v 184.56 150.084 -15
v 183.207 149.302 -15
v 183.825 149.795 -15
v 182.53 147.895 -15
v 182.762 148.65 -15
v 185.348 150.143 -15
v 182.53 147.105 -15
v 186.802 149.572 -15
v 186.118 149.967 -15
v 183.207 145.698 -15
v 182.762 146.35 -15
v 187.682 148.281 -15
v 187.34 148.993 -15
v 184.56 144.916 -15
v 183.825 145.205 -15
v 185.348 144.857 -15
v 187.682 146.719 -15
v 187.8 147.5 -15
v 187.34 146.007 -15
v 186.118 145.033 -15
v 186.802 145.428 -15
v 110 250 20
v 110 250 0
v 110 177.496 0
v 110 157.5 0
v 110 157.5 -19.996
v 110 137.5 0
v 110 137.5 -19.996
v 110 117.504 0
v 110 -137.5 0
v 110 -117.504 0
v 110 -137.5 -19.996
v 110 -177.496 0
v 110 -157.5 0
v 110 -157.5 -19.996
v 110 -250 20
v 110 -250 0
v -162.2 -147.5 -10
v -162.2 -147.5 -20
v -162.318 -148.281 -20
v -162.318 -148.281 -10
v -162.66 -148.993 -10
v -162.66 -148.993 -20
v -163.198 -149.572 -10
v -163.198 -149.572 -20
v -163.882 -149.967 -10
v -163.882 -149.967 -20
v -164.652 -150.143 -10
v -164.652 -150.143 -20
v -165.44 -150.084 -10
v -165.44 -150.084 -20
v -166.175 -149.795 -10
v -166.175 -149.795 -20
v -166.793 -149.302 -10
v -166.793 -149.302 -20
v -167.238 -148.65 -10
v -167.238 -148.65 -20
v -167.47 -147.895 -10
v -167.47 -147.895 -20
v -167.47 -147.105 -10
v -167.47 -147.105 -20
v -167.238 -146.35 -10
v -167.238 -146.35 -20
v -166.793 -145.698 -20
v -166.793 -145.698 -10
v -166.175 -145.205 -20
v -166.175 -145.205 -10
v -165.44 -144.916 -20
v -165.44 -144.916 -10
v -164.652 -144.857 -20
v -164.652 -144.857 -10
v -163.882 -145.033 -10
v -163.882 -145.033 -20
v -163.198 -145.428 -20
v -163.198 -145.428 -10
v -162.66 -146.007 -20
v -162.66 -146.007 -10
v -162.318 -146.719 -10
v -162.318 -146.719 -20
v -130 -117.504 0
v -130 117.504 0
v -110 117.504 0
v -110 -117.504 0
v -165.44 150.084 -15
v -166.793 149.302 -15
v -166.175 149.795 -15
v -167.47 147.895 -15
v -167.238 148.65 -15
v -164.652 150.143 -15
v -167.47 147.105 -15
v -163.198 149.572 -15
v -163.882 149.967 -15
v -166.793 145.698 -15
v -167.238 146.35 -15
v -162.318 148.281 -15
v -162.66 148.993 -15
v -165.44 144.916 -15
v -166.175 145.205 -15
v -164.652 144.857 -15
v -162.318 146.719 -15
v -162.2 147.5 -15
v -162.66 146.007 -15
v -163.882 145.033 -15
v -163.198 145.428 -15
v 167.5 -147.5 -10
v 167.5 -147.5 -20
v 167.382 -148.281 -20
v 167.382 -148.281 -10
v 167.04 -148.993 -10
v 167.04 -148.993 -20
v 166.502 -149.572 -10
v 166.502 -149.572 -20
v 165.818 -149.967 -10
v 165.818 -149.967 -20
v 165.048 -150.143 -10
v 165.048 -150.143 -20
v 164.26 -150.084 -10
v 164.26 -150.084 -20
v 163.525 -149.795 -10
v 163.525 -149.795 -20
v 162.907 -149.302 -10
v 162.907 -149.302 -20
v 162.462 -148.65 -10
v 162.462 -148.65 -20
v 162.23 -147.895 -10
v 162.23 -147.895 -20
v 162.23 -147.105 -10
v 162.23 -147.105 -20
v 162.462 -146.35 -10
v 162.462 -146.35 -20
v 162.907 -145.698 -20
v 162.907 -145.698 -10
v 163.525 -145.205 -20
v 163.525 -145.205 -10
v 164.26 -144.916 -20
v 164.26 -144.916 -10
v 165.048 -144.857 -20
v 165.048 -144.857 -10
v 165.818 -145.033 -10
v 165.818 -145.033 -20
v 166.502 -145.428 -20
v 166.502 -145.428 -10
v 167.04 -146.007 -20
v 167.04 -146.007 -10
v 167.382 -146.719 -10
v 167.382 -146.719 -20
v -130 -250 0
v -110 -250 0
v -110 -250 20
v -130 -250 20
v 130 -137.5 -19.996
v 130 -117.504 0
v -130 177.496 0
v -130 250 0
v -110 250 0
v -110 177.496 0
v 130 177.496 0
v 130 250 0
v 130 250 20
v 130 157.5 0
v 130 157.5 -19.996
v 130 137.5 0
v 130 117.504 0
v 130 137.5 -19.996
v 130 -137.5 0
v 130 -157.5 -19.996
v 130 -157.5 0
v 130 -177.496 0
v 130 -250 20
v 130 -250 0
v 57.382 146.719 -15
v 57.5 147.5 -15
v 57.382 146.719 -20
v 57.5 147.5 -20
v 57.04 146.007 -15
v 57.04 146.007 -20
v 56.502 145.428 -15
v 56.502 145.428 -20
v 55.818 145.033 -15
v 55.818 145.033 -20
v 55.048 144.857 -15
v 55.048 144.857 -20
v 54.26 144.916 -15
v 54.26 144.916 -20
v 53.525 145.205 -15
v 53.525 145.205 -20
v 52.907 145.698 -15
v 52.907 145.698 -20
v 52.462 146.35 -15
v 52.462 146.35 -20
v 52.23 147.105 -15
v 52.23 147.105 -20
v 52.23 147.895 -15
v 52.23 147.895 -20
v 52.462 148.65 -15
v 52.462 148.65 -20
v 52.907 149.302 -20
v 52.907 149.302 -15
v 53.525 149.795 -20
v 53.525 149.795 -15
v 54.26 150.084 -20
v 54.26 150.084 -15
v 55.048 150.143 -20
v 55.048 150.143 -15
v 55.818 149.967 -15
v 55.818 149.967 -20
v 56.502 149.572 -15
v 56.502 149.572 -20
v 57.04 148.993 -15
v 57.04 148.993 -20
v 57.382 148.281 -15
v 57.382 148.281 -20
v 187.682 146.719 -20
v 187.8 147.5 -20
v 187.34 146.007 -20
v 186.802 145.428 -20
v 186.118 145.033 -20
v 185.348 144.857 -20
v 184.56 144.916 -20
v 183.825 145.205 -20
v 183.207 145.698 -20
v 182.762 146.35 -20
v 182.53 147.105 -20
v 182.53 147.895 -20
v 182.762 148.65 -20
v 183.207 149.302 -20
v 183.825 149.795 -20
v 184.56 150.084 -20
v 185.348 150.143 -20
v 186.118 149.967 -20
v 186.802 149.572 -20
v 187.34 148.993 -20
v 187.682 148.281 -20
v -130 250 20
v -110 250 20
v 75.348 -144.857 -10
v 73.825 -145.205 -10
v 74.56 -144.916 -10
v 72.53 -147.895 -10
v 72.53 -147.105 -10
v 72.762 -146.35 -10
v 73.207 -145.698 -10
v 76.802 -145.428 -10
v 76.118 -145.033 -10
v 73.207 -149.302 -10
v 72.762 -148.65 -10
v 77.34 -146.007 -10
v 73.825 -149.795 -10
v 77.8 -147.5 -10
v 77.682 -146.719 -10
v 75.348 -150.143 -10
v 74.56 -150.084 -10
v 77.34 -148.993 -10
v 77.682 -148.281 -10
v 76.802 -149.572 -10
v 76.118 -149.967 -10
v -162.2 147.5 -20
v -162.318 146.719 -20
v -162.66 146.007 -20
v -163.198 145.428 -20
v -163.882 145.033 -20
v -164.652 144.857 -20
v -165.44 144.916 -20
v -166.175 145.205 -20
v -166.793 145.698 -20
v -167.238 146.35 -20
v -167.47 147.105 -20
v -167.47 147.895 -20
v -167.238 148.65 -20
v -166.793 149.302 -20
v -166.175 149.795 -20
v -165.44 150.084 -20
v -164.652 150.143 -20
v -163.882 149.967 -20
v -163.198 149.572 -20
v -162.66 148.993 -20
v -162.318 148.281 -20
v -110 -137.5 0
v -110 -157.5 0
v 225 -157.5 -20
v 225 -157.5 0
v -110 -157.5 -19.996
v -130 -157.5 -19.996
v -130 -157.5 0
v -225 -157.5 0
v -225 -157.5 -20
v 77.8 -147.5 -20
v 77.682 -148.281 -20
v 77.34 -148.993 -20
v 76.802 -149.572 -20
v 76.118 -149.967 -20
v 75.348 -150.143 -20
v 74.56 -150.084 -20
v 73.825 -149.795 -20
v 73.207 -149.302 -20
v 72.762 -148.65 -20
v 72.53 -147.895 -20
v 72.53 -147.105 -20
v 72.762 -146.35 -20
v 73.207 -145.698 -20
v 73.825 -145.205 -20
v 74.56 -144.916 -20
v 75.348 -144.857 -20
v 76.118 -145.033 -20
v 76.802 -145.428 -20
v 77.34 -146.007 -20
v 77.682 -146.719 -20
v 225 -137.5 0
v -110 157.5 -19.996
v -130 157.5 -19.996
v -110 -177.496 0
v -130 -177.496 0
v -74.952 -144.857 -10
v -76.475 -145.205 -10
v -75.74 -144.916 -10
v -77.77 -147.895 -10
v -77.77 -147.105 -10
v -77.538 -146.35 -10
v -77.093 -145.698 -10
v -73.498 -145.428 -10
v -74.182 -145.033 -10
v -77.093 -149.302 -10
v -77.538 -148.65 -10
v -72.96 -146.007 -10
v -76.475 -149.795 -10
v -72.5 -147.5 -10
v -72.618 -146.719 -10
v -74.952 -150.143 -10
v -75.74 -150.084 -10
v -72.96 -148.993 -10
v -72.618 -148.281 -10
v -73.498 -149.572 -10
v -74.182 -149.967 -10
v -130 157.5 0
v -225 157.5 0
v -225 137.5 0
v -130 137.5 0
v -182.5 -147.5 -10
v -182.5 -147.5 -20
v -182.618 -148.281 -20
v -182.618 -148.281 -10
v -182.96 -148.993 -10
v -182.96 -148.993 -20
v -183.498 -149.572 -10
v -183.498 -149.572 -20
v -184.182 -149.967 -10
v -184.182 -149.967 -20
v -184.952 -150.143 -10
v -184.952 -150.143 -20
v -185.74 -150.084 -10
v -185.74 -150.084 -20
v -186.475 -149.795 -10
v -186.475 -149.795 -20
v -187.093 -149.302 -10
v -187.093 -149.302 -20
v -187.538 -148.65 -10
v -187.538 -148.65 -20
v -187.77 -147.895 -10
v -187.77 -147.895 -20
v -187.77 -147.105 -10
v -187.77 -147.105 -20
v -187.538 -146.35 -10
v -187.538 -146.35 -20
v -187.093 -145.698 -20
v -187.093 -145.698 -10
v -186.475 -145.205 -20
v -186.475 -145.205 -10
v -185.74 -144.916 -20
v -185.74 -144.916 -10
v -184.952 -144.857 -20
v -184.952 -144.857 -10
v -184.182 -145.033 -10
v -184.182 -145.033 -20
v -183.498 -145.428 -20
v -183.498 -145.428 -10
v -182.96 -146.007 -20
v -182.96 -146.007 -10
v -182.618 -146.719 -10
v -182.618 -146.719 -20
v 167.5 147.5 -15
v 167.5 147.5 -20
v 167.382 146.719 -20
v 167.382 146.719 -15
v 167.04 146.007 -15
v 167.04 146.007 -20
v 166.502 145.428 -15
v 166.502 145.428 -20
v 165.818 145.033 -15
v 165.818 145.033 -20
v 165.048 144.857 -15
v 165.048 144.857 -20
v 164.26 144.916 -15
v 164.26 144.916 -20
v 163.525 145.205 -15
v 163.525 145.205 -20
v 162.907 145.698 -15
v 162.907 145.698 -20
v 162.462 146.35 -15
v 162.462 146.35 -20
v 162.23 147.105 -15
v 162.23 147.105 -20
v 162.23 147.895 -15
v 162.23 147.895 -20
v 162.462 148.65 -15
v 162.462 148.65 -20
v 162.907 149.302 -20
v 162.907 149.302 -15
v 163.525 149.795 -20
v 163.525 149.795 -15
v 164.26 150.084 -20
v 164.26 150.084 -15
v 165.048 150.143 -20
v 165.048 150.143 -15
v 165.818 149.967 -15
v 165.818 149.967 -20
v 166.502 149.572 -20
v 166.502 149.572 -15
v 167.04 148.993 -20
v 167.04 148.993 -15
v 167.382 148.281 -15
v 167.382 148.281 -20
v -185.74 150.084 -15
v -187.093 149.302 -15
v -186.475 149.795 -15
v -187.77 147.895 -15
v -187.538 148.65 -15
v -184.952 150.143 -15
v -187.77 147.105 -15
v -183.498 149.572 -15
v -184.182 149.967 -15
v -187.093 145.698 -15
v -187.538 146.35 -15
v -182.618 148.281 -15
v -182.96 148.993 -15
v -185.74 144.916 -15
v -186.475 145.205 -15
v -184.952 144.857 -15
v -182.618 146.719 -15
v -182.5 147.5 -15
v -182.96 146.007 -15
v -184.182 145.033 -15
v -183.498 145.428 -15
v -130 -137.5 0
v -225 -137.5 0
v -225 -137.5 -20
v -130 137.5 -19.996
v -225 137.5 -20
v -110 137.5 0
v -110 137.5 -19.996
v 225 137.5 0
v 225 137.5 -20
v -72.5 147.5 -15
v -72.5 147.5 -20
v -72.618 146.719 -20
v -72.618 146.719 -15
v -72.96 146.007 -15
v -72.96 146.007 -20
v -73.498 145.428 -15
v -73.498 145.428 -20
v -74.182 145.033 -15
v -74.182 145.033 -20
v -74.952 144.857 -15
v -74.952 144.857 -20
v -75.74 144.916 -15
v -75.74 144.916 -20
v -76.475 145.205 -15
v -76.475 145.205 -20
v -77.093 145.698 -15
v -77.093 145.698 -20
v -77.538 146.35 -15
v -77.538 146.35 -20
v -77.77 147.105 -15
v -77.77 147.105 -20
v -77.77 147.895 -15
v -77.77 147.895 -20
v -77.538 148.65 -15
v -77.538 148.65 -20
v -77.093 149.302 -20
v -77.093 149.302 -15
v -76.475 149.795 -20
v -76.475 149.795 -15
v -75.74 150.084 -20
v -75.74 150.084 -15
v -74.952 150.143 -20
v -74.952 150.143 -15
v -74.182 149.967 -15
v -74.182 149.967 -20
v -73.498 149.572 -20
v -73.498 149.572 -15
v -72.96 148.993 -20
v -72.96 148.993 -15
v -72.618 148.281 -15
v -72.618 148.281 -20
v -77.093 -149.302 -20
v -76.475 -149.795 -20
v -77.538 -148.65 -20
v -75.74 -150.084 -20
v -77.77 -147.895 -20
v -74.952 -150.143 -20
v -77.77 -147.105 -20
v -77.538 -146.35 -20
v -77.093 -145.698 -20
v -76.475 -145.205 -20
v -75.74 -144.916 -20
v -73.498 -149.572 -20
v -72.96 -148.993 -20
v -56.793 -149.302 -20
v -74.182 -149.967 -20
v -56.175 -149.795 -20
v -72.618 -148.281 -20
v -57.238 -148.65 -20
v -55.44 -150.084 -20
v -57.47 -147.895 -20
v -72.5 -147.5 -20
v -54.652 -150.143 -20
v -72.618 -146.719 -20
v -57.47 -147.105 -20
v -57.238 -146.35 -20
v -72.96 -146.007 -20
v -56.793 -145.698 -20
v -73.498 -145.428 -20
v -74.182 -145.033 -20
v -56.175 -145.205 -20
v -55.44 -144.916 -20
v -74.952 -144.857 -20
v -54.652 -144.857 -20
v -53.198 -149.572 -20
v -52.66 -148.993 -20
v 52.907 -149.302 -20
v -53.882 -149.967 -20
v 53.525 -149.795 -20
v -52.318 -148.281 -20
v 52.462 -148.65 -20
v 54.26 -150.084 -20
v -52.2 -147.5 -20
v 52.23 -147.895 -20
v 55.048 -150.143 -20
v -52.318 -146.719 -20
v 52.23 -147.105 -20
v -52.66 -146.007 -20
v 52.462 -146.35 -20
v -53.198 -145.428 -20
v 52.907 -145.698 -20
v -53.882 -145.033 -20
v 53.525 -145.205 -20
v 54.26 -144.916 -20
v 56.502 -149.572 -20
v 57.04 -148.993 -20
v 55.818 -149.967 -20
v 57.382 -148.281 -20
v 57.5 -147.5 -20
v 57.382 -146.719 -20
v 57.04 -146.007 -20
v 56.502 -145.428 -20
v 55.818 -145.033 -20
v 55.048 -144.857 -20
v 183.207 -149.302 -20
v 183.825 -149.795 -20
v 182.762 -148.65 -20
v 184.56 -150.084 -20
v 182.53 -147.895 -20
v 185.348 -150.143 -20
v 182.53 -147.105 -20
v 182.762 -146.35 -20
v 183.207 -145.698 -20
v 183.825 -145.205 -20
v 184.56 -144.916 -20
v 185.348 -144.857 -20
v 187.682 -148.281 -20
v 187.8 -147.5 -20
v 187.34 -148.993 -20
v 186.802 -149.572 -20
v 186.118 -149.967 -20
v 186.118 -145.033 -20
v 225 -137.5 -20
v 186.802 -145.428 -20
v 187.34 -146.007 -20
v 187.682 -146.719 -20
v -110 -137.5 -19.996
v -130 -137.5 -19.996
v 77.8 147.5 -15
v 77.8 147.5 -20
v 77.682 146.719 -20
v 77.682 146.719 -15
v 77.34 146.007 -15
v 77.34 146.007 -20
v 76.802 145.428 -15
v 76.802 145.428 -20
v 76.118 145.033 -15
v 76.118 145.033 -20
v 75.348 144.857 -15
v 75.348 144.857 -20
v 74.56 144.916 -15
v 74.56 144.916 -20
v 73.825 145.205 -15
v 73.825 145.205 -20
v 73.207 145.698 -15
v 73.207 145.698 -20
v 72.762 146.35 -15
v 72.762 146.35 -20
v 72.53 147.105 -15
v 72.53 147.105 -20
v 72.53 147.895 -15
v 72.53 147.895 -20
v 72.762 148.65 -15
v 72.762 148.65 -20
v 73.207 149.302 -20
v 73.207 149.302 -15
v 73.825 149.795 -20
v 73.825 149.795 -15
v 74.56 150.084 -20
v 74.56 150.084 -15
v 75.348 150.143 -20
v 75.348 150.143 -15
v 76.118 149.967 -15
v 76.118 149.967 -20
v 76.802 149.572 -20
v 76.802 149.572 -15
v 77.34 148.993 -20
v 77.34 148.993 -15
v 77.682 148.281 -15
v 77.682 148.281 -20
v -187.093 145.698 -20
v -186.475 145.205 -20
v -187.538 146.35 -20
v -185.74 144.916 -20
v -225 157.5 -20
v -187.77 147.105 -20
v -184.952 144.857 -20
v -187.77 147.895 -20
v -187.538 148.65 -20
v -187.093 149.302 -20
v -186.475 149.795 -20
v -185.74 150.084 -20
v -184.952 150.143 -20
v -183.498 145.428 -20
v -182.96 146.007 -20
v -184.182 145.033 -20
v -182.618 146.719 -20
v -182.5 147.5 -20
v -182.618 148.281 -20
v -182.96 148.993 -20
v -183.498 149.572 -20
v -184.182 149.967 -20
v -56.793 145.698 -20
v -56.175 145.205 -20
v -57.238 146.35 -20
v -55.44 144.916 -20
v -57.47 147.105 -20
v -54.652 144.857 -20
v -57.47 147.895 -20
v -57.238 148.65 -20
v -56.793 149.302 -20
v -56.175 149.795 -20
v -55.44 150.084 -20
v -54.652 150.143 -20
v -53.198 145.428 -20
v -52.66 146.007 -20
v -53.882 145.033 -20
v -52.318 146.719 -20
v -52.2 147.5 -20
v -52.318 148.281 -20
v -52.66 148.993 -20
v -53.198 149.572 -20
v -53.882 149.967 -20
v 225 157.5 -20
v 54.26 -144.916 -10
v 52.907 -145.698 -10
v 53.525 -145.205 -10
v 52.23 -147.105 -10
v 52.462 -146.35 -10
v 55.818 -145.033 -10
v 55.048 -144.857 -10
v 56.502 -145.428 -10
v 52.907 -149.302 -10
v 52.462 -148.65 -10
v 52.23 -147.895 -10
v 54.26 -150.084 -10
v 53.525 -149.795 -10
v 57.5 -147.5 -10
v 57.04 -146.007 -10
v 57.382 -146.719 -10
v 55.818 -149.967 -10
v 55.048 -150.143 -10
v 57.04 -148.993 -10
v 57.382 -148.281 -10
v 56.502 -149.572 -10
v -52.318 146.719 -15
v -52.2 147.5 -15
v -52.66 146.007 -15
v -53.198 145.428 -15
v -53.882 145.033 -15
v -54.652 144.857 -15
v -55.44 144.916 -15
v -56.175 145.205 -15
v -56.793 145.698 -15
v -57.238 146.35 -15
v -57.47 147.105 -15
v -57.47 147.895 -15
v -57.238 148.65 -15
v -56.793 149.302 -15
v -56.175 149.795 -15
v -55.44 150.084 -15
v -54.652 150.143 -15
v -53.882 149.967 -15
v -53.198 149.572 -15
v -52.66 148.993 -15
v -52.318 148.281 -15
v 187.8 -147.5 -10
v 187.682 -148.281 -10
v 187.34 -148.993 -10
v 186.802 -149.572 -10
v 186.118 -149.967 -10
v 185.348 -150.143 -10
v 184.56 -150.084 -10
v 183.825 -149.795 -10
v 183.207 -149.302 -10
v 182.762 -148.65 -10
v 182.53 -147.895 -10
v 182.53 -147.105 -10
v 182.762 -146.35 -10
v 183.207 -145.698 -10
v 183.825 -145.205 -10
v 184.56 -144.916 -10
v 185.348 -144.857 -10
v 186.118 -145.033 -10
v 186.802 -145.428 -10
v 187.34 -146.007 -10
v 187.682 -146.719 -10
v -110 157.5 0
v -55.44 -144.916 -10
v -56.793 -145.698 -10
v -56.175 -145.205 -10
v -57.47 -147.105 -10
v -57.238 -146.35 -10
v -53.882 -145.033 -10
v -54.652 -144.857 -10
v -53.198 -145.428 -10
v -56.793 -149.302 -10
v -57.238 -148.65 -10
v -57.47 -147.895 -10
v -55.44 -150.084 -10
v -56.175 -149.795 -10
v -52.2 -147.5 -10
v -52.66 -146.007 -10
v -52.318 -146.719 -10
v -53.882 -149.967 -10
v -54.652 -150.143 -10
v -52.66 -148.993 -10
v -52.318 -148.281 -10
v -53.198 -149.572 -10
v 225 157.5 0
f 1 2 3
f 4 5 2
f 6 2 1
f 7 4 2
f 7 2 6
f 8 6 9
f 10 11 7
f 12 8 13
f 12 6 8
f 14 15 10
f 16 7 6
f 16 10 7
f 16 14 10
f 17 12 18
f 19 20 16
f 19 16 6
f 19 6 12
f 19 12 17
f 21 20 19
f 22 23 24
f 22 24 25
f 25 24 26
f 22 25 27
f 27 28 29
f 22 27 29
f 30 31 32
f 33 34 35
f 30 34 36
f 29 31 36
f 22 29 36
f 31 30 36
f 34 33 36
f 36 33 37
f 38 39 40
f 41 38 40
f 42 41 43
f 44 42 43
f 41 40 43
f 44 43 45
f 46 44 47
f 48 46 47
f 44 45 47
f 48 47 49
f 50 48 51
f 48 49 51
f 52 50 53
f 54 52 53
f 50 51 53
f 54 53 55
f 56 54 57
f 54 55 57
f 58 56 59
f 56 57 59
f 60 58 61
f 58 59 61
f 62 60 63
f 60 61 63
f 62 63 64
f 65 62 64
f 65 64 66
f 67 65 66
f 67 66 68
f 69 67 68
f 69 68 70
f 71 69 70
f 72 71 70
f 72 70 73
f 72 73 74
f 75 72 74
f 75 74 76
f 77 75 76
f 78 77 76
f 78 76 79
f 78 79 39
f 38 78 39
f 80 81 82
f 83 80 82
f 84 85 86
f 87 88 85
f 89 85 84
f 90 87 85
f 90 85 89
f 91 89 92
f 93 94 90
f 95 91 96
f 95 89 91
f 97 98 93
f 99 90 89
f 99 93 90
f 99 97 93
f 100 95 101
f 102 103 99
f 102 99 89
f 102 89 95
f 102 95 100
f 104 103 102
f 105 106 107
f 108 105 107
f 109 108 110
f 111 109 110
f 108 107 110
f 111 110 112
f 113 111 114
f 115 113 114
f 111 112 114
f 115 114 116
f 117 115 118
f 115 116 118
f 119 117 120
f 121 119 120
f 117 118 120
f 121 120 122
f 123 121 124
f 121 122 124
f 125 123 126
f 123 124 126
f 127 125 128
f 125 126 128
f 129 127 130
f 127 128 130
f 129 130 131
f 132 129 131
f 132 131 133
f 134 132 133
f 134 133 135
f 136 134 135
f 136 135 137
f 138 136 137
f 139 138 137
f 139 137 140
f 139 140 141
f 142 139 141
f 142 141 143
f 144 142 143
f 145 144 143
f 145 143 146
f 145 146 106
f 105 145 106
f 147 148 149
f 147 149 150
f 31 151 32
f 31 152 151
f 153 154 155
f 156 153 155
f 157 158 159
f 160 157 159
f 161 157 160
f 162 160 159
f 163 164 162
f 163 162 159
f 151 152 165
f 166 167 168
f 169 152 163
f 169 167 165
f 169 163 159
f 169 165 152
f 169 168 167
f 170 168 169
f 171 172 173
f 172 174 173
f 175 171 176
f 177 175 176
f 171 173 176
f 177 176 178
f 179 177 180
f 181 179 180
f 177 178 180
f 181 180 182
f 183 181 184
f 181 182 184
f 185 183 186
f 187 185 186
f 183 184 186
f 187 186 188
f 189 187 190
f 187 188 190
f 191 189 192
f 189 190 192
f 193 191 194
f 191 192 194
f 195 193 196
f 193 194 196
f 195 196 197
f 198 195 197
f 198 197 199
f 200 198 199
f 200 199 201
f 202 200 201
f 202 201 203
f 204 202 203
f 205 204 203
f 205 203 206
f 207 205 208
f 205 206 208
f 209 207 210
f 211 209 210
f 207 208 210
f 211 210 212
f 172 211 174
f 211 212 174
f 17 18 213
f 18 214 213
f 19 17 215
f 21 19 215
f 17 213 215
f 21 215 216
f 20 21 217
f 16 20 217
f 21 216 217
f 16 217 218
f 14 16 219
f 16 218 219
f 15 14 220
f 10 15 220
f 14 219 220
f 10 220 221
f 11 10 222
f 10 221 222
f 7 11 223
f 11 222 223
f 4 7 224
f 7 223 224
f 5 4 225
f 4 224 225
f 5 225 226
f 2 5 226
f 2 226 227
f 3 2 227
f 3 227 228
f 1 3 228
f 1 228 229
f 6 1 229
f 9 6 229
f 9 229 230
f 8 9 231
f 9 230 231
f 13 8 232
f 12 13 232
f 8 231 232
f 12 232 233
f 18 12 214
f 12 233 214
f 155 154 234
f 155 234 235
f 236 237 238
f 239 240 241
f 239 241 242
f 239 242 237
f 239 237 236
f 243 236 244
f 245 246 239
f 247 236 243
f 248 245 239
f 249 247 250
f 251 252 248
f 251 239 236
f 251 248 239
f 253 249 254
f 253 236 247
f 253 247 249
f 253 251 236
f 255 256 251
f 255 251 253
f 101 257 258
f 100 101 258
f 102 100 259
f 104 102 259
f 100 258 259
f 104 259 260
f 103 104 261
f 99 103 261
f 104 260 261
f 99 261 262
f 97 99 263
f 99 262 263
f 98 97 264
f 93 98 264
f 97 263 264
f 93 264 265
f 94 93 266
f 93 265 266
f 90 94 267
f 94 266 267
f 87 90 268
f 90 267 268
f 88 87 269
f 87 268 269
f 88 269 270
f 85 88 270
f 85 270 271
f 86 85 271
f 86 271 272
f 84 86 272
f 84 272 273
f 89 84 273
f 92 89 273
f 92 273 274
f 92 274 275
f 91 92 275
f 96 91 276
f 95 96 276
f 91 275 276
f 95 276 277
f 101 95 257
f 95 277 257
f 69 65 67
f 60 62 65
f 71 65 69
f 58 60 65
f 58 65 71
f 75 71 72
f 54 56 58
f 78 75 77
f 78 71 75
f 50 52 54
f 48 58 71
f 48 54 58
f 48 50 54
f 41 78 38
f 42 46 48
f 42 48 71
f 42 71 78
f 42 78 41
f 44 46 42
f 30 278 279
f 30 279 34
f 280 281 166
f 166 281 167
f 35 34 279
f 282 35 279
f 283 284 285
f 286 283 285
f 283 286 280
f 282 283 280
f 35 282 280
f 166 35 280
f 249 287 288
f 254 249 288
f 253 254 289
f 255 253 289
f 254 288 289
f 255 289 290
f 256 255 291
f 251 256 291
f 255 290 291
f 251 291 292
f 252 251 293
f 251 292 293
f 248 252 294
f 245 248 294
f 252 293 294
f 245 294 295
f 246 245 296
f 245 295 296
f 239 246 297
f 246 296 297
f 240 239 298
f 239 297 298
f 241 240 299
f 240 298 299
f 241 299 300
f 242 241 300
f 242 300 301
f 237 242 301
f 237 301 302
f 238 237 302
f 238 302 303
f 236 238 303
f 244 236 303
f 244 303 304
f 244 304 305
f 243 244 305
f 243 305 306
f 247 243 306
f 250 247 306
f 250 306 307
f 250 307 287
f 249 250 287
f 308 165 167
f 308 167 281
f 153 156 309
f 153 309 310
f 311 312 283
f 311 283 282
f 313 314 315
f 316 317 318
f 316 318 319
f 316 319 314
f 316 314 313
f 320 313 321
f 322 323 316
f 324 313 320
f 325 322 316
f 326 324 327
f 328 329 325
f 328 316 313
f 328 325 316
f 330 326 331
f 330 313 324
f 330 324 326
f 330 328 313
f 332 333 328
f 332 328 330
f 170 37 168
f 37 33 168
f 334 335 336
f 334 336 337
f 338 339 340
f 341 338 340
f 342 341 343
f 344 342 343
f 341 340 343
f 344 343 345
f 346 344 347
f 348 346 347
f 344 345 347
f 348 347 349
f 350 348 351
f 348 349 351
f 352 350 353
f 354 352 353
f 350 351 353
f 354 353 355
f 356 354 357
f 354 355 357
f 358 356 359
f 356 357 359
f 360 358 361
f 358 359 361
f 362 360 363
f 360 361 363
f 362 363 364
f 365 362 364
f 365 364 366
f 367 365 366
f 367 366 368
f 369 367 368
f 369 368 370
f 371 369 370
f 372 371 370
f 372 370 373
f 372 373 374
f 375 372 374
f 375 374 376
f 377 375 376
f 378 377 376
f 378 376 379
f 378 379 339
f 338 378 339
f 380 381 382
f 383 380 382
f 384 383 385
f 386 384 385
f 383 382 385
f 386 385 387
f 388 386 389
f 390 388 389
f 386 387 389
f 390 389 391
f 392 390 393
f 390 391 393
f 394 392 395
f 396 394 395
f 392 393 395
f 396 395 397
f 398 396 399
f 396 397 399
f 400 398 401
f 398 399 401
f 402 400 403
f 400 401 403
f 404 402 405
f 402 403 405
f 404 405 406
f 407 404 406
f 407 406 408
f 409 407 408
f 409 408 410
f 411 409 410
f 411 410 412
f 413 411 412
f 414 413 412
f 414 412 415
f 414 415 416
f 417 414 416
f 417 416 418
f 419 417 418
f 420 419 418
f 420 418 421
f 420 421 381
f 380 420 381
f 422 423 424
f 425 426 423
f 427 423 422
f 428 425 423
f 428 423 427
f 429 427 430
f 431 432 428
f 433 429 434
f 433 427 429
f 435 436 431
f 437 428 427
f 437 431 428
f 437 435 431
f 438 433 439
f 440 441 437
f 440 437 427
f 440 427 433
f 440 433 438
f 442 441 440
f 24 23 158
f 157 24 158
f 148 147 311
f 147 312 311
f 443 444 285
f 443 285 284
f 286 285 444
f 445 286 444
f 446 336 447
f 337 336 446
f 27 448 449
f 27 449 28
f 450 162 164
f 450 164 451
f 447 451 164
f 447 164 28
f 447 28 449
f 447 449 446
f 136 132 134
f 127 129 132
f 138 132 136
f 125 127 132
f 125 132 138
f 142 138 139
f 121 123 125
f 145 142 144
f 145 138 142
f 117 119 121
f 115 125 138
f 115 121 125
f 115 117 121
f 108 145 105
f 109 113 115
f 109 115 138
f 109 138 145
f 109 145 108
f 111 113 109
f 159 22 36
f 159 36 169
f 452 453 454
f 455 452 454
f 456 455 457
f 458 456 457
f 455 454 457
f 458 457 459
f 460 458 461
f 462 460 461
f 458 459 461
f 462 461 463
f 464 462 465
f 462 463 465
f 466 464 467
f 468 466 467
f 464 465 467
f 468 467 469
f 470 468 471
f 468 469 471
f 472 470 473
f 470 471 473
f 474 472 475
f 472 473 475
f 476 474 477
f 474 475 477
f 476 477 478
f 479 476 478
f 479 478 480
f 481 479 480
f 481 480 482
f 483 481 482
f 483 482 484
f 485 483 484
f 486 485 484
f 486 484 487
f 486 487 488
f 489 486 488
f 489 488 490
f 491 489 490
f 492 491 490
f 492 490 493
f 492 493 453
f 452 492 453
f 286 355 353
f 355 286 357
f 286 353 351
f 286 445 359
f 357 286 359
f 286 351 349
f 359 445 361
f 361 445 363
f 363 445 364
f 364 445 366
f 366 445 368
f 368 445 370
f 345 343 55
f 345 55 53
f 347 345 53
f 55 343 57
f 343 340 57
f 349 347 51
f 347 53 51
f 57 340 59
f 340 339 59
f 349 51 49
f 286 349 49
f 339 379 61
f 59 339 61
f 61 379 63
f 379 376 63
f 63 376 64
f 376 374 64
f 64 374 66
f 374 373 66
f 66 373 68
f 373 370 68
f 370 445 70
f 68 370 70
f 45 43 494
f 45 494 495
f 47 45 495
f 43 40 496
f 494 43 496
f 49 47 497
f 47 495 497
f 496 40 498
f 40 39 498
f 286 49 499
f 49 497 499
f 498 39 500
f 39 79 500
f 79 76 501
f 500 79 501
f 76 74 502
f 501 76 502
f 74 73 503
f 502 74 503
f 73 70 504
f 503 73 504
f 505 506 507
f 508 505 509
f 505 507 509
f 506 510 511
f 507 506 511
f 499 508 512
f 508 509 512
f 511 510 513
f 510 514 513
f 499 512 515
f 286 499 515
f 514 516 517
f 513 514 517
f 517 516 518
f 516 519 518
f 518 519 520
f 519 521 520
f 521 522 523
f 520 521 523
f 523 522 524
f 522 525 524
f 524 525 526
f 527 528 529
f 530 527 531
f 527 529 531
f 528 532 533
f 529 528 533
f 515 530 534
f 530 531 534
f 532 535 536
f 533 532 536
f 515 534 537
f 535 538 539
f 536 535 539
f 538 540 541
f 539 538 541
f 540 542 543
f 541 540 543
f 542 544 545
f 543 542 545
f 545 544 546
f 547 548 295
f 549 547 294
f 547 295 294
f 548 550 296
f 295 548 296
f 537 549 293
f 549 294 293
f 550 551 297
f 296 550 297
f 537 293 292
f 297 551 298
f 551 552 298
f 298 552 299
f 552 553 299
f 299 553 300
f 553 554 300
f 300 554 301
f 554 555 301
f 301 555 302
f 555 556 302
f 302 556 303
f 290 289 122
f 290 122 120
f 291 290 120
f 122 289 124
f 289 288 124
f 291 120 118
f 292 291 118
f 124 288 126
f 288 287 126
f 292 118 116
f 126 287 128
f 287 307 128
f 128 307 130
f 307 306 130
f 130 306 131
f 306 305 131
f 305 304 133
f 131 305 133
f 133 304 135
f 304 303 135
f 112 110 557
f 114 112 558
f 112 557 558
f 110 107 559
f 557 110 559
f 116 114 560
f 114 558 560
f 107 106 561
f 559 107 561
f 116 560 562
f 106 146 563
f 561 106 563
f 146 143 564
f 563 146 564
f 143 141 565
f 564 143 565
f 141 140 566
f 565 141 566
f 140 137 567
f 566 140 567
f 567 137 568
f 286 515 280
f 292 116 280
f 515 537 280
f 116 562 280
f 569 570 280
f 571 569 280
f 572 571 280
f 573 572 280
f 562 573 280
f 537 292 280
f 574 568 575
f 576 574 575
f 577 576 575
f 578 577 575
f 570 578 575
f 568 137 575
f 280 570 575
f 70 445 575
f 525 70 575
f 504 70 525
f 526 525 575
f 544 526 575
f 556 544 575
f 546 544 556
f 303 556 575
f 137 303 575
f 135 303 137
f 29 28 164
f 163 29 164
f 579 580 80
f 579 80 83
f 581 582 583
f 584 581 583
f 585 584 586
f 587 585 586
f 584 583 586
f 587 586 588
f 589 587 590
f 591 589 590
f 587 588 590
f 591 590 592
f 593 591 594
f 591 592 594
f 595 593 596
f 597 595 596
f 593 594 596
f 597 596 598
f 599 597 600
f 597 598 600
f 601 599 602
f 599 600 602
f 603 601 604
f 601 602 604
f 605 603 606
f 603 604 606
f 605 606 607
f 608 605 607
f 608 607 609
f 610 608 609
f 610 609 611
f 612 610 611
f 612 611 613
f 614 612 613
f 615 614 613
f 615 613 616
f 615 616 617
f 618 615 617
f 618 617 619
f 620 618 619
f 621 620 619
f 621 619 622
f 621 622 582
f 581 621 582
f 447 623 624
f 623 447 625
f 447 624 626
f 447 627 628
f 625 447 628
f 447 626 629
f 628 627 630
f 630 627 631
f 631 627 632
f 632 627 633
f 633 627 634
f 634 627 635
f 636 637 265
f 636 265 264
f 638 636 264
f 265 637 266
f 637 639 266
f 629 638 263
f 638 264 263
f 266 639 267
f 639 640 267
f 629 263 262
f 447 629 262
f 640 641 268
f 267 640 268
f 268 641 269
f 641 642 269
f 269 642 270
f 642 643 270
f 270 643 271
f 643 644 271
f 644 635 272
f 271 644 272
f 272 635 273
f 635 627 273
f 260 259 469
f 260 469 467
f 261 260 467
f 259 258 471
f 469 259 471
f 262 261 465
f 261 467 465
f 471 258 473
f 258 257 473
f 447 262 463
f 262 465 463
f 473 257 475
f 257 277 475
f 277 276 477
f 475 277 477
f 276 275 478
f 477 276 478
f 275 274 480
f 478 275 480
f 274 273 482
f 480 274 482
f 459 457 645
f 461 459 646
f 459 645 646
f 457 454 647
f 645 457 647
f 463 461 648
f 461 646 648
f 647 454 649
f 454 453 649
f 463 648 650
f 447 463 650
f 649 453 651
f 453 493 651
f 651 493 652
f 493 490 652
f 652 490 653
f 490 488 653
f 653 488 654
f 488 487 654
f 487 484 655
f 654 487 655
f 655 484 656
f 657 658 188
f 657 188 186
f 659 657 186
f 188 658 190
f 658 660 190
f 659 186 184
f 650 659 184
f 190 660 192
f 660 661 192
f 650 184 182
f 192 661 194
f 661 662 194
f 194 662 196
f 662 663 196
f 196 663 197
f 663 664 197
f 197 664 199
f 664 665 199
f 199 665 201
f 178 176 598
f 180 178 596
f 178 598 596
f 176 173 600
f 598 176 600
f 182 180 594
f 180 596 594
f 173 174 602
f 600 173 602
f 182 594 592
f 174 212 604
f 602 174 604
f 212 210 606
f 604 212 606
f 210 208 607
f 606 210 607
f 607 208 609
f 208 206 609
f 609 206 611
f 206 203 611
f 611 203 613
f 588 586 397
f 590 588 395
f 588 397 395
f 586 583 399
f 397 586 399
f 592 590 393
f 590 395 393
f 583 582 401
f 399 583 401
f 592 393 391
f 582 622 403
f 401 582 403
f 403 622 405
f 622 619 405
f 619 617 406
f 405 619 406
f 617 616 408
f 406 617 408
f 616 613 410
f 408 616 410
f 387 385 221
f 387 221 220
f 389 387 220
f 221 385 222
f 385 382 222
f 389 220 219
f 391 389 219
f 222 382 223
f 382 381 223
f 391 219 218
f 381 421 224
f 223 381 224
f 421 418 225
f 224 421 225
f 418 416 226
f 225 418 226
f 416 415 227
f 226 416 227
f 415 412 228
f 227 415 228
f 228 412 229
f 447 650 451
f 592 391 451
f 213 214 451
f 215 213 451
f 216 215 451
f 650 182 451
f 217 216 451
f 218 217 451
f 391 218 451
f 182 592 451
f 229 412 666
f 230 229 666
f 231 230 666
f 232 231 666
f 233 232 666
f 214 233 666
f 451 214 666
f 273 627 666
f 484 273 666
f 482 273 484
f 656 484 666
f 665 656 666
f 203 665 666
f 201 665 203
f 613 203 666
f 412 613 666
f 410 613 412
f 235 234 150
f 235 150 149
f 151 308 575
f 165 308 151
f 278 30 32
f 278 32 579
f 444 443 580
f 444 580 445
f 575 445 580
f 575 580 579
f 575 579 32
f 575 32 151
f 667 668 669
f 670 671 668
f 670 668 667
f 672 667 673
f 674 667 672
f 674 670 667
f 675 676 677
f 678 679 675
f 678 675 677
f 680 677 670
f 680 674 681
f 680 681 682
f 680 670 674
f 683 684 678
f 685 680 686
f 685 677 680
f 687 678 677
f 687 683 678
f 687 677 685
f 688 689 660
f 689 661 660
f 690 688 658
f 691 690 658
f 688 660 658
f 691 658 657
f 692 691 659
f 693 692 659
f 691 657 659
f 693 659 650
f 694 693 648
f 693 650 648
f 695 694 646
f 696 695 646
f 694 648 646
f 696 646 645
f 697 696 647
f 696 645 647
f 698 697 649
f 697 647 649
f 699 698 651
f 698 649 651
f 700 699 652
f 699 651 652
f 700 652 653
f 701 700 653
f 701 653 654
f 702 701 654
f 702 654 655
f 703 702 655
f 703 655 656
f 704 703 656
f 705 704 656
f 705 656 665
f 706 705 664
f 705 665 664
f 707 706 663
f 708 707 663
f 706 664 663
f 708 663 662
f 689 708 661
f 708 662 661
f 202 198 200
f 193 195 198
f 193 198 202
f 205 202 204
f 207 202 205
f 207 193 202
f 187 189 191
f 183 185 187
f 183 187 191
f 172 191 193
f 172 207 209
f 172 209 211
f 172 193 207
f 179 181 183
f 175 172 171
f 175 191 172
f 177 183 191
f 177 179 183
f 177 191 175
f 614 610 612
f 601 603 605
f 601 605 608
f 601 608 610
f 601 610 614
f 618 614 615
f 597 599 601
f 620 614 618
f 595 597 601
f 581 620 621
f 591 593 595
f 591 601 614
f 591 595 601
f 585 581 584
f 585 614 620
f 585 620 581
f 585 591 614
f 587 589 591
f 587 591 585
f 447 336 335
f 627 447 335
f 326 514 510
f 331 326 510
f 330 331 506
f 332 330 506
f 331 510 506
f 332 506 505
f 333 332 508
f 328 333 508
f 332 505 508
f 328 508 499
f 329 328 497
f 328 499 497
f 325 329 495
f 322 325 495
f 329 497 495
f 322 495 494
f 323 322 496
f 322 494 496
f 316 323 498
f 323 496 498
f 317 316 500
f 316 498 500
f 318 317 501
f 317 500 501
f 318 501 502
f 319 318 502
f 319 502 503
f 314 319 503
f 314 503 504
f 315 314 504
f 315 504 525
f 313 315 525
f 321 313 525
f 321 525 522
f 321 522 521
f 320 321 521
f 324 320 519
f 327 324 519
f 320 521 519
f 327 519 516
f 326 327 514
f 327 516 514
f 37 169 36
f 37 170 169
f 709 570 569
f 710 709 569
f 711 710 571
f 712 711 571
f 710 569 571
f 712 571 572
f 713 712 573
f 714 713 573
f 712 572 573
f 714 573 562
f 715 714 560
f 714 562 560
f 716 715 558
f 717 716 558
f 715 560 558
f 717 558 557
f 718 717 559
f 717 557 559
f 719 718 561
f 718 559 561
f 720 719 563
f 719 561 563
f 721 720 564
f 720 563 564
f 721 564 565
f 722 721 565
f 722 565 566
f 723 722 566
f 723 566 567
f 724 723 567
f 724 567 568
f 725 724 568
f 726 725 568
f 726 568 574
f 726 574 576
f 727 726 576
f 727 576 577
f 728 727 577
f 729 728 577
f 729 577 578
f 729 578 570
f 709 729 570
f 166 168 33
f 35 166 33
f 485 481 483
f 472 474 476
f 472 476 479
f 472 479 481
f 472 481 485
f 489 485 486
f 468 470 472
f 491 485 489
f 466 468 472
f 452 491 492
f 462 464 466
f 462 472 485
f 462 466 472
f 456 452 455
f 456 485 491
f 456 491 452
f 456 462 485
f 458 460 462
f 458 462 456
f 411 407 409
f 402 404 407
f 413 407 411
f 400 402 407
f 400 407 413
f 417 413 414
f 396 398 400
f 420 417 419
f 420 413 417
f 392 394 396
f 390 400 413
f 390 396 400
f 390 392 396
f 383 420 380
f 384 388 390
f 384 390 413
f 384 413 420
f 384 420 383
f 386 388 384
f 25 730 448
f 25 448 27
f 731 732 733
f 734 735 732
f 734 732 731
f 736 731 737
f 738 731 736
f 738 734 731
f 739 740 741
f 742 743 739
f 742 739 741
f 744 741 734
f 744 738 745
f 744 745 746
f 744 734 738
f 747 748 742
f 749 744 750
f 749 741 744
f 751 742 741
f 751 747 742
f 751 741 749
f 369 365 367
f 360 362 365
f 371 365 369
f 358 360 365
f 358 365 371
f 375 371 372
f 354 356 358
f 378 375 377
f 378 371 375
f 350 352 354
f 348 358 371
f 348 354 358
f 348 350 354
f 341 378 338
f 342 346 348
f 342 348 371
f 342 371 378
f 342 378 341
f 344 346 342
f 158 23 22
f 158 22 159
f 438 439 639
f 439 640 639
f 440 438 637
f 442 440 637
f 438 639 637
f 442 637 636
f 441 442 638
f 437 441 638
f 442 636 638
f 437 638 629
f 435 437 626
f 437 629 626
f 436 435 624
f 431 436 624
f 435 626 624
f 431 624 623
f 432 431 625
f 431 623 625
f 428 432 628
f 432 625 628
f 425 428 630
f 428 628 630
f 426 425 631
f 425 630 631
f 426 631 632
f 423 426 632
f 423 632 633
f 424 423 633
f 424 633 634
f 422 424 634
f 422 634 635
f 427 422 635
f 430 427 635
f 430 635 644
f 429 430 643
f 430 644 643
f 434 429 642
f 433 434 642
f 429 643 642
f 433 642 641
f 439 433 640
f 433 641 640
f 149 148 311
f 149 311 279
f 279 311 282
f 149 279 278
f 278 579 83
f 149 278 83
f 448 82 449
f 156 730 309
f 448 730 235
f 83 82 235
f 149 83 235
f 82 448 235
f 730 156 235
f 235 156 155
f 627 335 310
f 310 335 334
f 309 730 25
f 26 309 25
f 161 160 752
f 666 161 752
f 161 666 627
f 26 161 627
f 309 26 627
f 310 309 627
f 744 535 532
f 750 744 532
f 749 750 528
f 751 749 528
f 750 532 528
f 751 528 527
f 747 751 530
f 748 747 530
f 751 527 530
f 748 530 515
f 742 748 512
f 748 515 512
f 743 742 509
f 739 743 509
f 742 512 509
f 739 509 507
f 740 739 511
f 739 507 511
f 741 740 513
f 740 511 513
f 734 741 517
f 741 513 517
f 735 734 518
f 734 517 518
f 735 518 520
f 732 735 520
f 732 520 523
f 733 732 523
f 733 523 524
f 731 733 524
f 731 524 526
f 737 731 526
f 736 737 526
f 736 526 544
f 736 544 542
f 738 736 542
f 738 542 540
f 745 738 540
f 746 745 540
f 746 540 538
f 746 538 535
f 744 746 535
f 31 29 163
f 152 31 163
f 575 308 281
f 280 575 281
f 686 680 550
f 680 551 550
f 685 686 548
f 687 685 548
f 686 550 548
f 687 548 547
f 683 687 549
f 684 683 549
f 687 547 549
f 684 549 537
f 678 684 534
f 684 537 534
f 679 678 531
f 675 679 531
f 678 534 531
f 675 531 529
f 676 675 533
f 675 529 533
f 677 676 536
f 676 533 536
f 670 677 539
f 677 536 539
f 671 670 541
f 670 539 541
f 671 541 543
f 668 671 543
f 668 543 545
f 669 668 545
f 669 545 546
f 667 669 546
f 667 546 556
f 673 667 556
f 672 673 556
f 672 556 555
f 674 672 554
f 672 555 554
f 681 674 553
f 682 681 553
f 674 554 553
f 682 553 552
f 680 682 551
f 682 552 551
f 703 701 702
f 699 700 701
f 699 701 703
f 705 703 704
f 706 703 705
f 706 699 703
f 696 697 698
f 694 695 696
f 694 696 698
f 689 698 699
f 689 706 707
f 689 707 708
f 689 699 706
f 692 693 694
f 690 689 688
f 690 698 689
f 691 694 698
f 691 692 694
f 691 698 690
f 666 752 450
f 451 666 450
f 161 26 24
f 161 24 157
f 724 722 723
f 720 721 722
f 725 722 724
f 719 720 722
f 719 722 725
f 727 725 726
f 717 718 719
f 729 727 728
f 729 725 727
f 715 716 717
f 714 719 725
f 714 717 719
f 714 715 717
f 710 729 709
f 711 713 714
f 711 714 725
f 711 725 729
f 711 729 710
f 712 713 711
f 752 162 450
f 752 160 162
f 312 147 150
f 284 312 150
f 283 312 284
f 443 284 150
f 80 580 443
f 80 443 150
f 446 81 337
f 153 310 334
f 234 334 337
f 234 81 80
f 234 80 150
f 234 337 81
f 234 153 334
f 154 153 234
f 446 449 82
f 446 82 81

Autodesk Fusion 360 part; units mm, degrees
sketch "草图1" plane through (0, 0, 0) normal (0, 0, 1) x (1, 0, 0)
  line L0 (110, -137.5) -> (-110, -137.5)
  line L1 (-110, -137.5) -> (-110, 137.5)
  line L2 (-110, 137.5) -> (110, 137.5)
  line L3 (110, 137.5) -> (110, -137.5)
  line L4 (110, -137.5) -> (-110, 137.5) construction
  line L5 (-110, -137.5) -> (110, 137.5) construction
  line L6 (130, -157.5) -> (-130, -157.5)
  line L7 (-130, -157.5) -> (-130, 157.5)
  line L8 (-130, 157.5) -> (130, 157.5)
  line L9 (130, 157.5) -> (130, -157.5)
  line L10 (130, -157.5) -> (-130, 157.5) construction
  line L11 (-130, -157.5) -> (130, 157.5) construction
  line L12 (110, 137.5) -> (225, 137.5)
  line L13 (225, 137.5) -> (-225, 137.5)
  line L14 (0, 0) -> (0, 157.5) construction
  line L15 (0, 0) -> (0, -157.5) construction
  line L16 (-110, 137.5) -> (-110, 250)
  line L17 (-110, 250) -> (-110, -250)
  line L18 (0, 0) -> (-130, 0) construction
  line L19 (-225, 250) -> (225, 250)
  line L20 (225, 250) -> (225, -250)
  line L21 (225, -250) -> (-225, -250)
  line L22 (-225, -250) -> (-225, 250)
  line L23 (-225, 250) -> (225, -250) construction
  line L24 (225, 250) -> (-225, -250) construction
  line L25 (-130, 250) -> (-130, -250)
  line L26 (225, -157.5) -> (-225, -157.5)
  line L27 (-225, -137.5) -> (225, -137.5)
  line L28 (110, 250) -> (110, -250)
  line L29 (130, -250) -> (130, 250)
  line L30 (225, 157.5) -> (-225, 157.5)
  point P0 (-110, 0)
  dimension "d1" = 220
  dimension "d2" = 275
  dimension "d3" = 20
  dimension "d4" = 20
  dimension "d5" = 450
  dimension "d6" = 95
  dimension "d7" = 95
  dimension "d8" = 500
  dimension "d9" = 92.5
  dimension "d15" = 450
  dimension "d16" = 500
extrude "拉伸1" add sketch "草图1" along normal blind 20 contours L3 L9 L12 L13 L27 L28 L29 | L6 L9 L26 L27 L28 L29 | L1 L7 L13 L17 L25 L27 | L6 L7 L17 L25 L26 L27 | L8 L9 L12 L13 L28 L29 L30 | L6 L21 L26 L28 L29 | L7 L8 L13 L16 L17 L25 L30 | L6 L17 L21 L25 L26 | L8 L19 L28 L29 L30 | L8 L16 L17 L19 L25 L30 makes body 1 at (-110, 83.3333, 6.6667) makes body 2 at (130, 83.3333, 6.6667)
extrude "拉伸2" add sketch "草图1" against normal blind 20 contours L0 L6 L17 L26 L27 L28 | L6 L9 L26 L27 L28 L29 | L6 L7 L17 L25 L26 L27 | L8 L9 L12 L13 L28 L29 L30 | L2 L8 L13 L16 L17 L28 L30 | L9 L20 L26 L27 L29 | L7 L8 L13 L16 L17 L25 L30 | L7 L22 L25 L26 L27 | L9 L12 L13 L20 L29 L30 | L7 L13 L22 L25 L30 bodies 1 2
chamfer "倒角1" distance 20 angle 45 8 edges at (-120, -157.5, 0) (120, -157.5, 0) (-120, 137.5, 0) (120, 137.5, 0) (-120, -137.5, 0) (-120, 157.5, 0) (120, 157.5, 0) (120, -137.5, 0) on bodies 1
sketch "草图2" plane through (0, 0, -20) normal (0, 0, -1) x (1, 0, 0)
  line L0 (-225, 157.5) -> (-225, 137.5)
  line L1 (-225, 137.5) -> (-130, 137.5)
  line L2 (-130, 137.5) -> (-110, 137.5)
  line L3 (-110, 137.5) -> (110, 137.5)
  line L4 (110, 137.5) -> (130, 137.5)
  line L5 (130, 137.5) -> (225, 137.5)
  line L6 (225, 137.5) -> (225, 157.5)
  line L7 (225, 157.5) -> (130, 157.5)
  line L8 (130, 157.5) -> (110, 157.5)
  line L9 (110, 157.5) -> (-110, 157.5)
  line L10 (-110, 157.5) -> (-130, 157.5)
  line L11 (-130, 157.5) -> (-225, 157.5)
  line L12 (-130, 157.5) -> (-130, 137.5) construction
  line L13 (-110, 157.5) -> (-110, 137.5) construction
  line L14 (110, 157.5) -> (110, 137.5) construction
  line L15 (130, 157.5) -> (130, 137.5) construction
  line L16 (-225, 147.5) -> (225, 147.5) construction
  circle A0 centre (-185.15, 147.5) radius 2.65
  circle A1 centre (-164.85, 147.5) radius 2.65
  circle A2 centre (164.85, 147.5) radius 2.65
  circle A3 centre (185.15, 147.5) radius 2.65
  circle A4 centre (-75.15, 147.5) radius 2.65
  circle A5 centre (-54.85, 147.5) radius 2.65
  circle A6 centre (54.85, 147.5) radius 2.65
  circle A7 centre (75.15, 147.5) radius 2.65
  point P0 (-185.15, 147.5)
  point P1 (-164.85, 147.5)
  point P2 (164.85, 147.5)
  point P3 (185.15, 147.5)
  point P4 (-75.15, 147.5)
  point P5 (-54.85, 147.5)
  point P6 (75.15, 147.5)
  point P7 (54.85, 147.5)
  dimension "d17" = 55.15
  dimension "d18" = 55.15
  dimension "d19" = 20.3
  dimension "d20" = 20.3
  dimension "d21" = 5.3
  dimension "d22" = 5.3
  dimension "d23" = 5.3
  dimension "d24" = 5.3
  dimension "d25" = 55.15
  dimension "d26" = 55.15
  dimension "d27" = 20.3
  dimension "d28" = 20.3
  dimension "d29" = 5.3
  dimension "d30" = 5.3
  dimension "d31" = 5.3
  dimension "d32" = 5.3
extrude "拉伸3" cut sketch "草图2" against normal blind 10 contours A0 | A1 | A2 | A3 | A4 | A5 | A6 | A7 bodies 1
sketch "草图3" plane through (0, 0, -20) normal (0, 0, -1) x (1, 0, 0)
  line L0 (225, -157.5) -> (225, -137.5)
  line L1 (225, -137.5) -> (130, -137.5)
  line L2 (130, -137.5) -> (110, -137.5)
  line L3 (110, -137.5) -> (-110, -137.5)
  line L4 (-110, -137.5) -> (-130, -137.5)
  line L5 (-130, -137.5) -> (-225, -137.5)
  line L6 (-225, -137.5) -> (-225, -157.5)
  line L7 (-225, -157.5) -> (-130, -157.5)
  line L8 (-130, -157.5) -> (-110, -157.5)
  line L9 (-110, -157.5) -> (110, -157.5)
  line L10 (110, -157.5) -> (130, -157.5)
  line L11 (130, -157.5) -> (225, -157.5)
  line L12 (-130, -137.5) -> (-130, -157.5)
  line L13 (-110, -137.5) -> (-110, -157.5)
  line L14 (110, -137.5) -> (110, -157.5)
  line L15 (130, -137.5) -> (130, -157.5)
  line L16 (225, -147.5) -> (-225, -147.5) construction
  circle A0 centre (-185.15, -147.5) radius 2.65
  circle A1 centre (-164.85, -147.5) radius 2.65
  circle A2 centre (-75.15, -147.5) radius 2.65
  circle A3 centre (-54.85, -147.5) radius 2.65
  circle A4 centre (54.85, -147.5) radius 2.65
  circle A5 centre (75.15, -147.5) radius 2.65
  circle A6 centre (164.85, -147.5) radius 2.65
  circle A7 centre (185.15, -147.5) radius 2.65
  point P0 (-164.85, -147.5)
  point P1 (-185.15, -147.5)
  point P2 (-75.15, -147.5)
  point P3 (-54.85, -147.5)
  point P4 (54.85, -147.5)
  point P5 (75.15, -147.5)
  point P6 (164.85, -147.5)
  point P7 (185.15, -147.5)
  dimension "d35" = 5.3
  dimension "d36" = 5.3
  dimension "d37" = 5.3
  dimension "d38" = 5.3
  dimension "d39" = 5.3
  dimension "d40" = 5.3
  dimension "d41" = 5.3
  dimension "d42" = 5.3
  dimension "d43" = 55.15
  dimension "d44" = 55.15
  dimension "d45" = 55.15
  dimension "d46" = 55.15
  dimension "d47" = 20.3
  dimension "d48" = 20.3
  dimension "d49" = 20.3
  dimension "d50" = 20.3
extrude "拉伸4" cut sketch "草图2" sketch "草图3" against normal blind 5 contours A0 | A1 | A2 | A3 | A4 | A5 | A6 | A7 of sketch 2 contours A0 | A1 | A2 | A3 | A4 | A5 | A6 | A7 bodies 1
